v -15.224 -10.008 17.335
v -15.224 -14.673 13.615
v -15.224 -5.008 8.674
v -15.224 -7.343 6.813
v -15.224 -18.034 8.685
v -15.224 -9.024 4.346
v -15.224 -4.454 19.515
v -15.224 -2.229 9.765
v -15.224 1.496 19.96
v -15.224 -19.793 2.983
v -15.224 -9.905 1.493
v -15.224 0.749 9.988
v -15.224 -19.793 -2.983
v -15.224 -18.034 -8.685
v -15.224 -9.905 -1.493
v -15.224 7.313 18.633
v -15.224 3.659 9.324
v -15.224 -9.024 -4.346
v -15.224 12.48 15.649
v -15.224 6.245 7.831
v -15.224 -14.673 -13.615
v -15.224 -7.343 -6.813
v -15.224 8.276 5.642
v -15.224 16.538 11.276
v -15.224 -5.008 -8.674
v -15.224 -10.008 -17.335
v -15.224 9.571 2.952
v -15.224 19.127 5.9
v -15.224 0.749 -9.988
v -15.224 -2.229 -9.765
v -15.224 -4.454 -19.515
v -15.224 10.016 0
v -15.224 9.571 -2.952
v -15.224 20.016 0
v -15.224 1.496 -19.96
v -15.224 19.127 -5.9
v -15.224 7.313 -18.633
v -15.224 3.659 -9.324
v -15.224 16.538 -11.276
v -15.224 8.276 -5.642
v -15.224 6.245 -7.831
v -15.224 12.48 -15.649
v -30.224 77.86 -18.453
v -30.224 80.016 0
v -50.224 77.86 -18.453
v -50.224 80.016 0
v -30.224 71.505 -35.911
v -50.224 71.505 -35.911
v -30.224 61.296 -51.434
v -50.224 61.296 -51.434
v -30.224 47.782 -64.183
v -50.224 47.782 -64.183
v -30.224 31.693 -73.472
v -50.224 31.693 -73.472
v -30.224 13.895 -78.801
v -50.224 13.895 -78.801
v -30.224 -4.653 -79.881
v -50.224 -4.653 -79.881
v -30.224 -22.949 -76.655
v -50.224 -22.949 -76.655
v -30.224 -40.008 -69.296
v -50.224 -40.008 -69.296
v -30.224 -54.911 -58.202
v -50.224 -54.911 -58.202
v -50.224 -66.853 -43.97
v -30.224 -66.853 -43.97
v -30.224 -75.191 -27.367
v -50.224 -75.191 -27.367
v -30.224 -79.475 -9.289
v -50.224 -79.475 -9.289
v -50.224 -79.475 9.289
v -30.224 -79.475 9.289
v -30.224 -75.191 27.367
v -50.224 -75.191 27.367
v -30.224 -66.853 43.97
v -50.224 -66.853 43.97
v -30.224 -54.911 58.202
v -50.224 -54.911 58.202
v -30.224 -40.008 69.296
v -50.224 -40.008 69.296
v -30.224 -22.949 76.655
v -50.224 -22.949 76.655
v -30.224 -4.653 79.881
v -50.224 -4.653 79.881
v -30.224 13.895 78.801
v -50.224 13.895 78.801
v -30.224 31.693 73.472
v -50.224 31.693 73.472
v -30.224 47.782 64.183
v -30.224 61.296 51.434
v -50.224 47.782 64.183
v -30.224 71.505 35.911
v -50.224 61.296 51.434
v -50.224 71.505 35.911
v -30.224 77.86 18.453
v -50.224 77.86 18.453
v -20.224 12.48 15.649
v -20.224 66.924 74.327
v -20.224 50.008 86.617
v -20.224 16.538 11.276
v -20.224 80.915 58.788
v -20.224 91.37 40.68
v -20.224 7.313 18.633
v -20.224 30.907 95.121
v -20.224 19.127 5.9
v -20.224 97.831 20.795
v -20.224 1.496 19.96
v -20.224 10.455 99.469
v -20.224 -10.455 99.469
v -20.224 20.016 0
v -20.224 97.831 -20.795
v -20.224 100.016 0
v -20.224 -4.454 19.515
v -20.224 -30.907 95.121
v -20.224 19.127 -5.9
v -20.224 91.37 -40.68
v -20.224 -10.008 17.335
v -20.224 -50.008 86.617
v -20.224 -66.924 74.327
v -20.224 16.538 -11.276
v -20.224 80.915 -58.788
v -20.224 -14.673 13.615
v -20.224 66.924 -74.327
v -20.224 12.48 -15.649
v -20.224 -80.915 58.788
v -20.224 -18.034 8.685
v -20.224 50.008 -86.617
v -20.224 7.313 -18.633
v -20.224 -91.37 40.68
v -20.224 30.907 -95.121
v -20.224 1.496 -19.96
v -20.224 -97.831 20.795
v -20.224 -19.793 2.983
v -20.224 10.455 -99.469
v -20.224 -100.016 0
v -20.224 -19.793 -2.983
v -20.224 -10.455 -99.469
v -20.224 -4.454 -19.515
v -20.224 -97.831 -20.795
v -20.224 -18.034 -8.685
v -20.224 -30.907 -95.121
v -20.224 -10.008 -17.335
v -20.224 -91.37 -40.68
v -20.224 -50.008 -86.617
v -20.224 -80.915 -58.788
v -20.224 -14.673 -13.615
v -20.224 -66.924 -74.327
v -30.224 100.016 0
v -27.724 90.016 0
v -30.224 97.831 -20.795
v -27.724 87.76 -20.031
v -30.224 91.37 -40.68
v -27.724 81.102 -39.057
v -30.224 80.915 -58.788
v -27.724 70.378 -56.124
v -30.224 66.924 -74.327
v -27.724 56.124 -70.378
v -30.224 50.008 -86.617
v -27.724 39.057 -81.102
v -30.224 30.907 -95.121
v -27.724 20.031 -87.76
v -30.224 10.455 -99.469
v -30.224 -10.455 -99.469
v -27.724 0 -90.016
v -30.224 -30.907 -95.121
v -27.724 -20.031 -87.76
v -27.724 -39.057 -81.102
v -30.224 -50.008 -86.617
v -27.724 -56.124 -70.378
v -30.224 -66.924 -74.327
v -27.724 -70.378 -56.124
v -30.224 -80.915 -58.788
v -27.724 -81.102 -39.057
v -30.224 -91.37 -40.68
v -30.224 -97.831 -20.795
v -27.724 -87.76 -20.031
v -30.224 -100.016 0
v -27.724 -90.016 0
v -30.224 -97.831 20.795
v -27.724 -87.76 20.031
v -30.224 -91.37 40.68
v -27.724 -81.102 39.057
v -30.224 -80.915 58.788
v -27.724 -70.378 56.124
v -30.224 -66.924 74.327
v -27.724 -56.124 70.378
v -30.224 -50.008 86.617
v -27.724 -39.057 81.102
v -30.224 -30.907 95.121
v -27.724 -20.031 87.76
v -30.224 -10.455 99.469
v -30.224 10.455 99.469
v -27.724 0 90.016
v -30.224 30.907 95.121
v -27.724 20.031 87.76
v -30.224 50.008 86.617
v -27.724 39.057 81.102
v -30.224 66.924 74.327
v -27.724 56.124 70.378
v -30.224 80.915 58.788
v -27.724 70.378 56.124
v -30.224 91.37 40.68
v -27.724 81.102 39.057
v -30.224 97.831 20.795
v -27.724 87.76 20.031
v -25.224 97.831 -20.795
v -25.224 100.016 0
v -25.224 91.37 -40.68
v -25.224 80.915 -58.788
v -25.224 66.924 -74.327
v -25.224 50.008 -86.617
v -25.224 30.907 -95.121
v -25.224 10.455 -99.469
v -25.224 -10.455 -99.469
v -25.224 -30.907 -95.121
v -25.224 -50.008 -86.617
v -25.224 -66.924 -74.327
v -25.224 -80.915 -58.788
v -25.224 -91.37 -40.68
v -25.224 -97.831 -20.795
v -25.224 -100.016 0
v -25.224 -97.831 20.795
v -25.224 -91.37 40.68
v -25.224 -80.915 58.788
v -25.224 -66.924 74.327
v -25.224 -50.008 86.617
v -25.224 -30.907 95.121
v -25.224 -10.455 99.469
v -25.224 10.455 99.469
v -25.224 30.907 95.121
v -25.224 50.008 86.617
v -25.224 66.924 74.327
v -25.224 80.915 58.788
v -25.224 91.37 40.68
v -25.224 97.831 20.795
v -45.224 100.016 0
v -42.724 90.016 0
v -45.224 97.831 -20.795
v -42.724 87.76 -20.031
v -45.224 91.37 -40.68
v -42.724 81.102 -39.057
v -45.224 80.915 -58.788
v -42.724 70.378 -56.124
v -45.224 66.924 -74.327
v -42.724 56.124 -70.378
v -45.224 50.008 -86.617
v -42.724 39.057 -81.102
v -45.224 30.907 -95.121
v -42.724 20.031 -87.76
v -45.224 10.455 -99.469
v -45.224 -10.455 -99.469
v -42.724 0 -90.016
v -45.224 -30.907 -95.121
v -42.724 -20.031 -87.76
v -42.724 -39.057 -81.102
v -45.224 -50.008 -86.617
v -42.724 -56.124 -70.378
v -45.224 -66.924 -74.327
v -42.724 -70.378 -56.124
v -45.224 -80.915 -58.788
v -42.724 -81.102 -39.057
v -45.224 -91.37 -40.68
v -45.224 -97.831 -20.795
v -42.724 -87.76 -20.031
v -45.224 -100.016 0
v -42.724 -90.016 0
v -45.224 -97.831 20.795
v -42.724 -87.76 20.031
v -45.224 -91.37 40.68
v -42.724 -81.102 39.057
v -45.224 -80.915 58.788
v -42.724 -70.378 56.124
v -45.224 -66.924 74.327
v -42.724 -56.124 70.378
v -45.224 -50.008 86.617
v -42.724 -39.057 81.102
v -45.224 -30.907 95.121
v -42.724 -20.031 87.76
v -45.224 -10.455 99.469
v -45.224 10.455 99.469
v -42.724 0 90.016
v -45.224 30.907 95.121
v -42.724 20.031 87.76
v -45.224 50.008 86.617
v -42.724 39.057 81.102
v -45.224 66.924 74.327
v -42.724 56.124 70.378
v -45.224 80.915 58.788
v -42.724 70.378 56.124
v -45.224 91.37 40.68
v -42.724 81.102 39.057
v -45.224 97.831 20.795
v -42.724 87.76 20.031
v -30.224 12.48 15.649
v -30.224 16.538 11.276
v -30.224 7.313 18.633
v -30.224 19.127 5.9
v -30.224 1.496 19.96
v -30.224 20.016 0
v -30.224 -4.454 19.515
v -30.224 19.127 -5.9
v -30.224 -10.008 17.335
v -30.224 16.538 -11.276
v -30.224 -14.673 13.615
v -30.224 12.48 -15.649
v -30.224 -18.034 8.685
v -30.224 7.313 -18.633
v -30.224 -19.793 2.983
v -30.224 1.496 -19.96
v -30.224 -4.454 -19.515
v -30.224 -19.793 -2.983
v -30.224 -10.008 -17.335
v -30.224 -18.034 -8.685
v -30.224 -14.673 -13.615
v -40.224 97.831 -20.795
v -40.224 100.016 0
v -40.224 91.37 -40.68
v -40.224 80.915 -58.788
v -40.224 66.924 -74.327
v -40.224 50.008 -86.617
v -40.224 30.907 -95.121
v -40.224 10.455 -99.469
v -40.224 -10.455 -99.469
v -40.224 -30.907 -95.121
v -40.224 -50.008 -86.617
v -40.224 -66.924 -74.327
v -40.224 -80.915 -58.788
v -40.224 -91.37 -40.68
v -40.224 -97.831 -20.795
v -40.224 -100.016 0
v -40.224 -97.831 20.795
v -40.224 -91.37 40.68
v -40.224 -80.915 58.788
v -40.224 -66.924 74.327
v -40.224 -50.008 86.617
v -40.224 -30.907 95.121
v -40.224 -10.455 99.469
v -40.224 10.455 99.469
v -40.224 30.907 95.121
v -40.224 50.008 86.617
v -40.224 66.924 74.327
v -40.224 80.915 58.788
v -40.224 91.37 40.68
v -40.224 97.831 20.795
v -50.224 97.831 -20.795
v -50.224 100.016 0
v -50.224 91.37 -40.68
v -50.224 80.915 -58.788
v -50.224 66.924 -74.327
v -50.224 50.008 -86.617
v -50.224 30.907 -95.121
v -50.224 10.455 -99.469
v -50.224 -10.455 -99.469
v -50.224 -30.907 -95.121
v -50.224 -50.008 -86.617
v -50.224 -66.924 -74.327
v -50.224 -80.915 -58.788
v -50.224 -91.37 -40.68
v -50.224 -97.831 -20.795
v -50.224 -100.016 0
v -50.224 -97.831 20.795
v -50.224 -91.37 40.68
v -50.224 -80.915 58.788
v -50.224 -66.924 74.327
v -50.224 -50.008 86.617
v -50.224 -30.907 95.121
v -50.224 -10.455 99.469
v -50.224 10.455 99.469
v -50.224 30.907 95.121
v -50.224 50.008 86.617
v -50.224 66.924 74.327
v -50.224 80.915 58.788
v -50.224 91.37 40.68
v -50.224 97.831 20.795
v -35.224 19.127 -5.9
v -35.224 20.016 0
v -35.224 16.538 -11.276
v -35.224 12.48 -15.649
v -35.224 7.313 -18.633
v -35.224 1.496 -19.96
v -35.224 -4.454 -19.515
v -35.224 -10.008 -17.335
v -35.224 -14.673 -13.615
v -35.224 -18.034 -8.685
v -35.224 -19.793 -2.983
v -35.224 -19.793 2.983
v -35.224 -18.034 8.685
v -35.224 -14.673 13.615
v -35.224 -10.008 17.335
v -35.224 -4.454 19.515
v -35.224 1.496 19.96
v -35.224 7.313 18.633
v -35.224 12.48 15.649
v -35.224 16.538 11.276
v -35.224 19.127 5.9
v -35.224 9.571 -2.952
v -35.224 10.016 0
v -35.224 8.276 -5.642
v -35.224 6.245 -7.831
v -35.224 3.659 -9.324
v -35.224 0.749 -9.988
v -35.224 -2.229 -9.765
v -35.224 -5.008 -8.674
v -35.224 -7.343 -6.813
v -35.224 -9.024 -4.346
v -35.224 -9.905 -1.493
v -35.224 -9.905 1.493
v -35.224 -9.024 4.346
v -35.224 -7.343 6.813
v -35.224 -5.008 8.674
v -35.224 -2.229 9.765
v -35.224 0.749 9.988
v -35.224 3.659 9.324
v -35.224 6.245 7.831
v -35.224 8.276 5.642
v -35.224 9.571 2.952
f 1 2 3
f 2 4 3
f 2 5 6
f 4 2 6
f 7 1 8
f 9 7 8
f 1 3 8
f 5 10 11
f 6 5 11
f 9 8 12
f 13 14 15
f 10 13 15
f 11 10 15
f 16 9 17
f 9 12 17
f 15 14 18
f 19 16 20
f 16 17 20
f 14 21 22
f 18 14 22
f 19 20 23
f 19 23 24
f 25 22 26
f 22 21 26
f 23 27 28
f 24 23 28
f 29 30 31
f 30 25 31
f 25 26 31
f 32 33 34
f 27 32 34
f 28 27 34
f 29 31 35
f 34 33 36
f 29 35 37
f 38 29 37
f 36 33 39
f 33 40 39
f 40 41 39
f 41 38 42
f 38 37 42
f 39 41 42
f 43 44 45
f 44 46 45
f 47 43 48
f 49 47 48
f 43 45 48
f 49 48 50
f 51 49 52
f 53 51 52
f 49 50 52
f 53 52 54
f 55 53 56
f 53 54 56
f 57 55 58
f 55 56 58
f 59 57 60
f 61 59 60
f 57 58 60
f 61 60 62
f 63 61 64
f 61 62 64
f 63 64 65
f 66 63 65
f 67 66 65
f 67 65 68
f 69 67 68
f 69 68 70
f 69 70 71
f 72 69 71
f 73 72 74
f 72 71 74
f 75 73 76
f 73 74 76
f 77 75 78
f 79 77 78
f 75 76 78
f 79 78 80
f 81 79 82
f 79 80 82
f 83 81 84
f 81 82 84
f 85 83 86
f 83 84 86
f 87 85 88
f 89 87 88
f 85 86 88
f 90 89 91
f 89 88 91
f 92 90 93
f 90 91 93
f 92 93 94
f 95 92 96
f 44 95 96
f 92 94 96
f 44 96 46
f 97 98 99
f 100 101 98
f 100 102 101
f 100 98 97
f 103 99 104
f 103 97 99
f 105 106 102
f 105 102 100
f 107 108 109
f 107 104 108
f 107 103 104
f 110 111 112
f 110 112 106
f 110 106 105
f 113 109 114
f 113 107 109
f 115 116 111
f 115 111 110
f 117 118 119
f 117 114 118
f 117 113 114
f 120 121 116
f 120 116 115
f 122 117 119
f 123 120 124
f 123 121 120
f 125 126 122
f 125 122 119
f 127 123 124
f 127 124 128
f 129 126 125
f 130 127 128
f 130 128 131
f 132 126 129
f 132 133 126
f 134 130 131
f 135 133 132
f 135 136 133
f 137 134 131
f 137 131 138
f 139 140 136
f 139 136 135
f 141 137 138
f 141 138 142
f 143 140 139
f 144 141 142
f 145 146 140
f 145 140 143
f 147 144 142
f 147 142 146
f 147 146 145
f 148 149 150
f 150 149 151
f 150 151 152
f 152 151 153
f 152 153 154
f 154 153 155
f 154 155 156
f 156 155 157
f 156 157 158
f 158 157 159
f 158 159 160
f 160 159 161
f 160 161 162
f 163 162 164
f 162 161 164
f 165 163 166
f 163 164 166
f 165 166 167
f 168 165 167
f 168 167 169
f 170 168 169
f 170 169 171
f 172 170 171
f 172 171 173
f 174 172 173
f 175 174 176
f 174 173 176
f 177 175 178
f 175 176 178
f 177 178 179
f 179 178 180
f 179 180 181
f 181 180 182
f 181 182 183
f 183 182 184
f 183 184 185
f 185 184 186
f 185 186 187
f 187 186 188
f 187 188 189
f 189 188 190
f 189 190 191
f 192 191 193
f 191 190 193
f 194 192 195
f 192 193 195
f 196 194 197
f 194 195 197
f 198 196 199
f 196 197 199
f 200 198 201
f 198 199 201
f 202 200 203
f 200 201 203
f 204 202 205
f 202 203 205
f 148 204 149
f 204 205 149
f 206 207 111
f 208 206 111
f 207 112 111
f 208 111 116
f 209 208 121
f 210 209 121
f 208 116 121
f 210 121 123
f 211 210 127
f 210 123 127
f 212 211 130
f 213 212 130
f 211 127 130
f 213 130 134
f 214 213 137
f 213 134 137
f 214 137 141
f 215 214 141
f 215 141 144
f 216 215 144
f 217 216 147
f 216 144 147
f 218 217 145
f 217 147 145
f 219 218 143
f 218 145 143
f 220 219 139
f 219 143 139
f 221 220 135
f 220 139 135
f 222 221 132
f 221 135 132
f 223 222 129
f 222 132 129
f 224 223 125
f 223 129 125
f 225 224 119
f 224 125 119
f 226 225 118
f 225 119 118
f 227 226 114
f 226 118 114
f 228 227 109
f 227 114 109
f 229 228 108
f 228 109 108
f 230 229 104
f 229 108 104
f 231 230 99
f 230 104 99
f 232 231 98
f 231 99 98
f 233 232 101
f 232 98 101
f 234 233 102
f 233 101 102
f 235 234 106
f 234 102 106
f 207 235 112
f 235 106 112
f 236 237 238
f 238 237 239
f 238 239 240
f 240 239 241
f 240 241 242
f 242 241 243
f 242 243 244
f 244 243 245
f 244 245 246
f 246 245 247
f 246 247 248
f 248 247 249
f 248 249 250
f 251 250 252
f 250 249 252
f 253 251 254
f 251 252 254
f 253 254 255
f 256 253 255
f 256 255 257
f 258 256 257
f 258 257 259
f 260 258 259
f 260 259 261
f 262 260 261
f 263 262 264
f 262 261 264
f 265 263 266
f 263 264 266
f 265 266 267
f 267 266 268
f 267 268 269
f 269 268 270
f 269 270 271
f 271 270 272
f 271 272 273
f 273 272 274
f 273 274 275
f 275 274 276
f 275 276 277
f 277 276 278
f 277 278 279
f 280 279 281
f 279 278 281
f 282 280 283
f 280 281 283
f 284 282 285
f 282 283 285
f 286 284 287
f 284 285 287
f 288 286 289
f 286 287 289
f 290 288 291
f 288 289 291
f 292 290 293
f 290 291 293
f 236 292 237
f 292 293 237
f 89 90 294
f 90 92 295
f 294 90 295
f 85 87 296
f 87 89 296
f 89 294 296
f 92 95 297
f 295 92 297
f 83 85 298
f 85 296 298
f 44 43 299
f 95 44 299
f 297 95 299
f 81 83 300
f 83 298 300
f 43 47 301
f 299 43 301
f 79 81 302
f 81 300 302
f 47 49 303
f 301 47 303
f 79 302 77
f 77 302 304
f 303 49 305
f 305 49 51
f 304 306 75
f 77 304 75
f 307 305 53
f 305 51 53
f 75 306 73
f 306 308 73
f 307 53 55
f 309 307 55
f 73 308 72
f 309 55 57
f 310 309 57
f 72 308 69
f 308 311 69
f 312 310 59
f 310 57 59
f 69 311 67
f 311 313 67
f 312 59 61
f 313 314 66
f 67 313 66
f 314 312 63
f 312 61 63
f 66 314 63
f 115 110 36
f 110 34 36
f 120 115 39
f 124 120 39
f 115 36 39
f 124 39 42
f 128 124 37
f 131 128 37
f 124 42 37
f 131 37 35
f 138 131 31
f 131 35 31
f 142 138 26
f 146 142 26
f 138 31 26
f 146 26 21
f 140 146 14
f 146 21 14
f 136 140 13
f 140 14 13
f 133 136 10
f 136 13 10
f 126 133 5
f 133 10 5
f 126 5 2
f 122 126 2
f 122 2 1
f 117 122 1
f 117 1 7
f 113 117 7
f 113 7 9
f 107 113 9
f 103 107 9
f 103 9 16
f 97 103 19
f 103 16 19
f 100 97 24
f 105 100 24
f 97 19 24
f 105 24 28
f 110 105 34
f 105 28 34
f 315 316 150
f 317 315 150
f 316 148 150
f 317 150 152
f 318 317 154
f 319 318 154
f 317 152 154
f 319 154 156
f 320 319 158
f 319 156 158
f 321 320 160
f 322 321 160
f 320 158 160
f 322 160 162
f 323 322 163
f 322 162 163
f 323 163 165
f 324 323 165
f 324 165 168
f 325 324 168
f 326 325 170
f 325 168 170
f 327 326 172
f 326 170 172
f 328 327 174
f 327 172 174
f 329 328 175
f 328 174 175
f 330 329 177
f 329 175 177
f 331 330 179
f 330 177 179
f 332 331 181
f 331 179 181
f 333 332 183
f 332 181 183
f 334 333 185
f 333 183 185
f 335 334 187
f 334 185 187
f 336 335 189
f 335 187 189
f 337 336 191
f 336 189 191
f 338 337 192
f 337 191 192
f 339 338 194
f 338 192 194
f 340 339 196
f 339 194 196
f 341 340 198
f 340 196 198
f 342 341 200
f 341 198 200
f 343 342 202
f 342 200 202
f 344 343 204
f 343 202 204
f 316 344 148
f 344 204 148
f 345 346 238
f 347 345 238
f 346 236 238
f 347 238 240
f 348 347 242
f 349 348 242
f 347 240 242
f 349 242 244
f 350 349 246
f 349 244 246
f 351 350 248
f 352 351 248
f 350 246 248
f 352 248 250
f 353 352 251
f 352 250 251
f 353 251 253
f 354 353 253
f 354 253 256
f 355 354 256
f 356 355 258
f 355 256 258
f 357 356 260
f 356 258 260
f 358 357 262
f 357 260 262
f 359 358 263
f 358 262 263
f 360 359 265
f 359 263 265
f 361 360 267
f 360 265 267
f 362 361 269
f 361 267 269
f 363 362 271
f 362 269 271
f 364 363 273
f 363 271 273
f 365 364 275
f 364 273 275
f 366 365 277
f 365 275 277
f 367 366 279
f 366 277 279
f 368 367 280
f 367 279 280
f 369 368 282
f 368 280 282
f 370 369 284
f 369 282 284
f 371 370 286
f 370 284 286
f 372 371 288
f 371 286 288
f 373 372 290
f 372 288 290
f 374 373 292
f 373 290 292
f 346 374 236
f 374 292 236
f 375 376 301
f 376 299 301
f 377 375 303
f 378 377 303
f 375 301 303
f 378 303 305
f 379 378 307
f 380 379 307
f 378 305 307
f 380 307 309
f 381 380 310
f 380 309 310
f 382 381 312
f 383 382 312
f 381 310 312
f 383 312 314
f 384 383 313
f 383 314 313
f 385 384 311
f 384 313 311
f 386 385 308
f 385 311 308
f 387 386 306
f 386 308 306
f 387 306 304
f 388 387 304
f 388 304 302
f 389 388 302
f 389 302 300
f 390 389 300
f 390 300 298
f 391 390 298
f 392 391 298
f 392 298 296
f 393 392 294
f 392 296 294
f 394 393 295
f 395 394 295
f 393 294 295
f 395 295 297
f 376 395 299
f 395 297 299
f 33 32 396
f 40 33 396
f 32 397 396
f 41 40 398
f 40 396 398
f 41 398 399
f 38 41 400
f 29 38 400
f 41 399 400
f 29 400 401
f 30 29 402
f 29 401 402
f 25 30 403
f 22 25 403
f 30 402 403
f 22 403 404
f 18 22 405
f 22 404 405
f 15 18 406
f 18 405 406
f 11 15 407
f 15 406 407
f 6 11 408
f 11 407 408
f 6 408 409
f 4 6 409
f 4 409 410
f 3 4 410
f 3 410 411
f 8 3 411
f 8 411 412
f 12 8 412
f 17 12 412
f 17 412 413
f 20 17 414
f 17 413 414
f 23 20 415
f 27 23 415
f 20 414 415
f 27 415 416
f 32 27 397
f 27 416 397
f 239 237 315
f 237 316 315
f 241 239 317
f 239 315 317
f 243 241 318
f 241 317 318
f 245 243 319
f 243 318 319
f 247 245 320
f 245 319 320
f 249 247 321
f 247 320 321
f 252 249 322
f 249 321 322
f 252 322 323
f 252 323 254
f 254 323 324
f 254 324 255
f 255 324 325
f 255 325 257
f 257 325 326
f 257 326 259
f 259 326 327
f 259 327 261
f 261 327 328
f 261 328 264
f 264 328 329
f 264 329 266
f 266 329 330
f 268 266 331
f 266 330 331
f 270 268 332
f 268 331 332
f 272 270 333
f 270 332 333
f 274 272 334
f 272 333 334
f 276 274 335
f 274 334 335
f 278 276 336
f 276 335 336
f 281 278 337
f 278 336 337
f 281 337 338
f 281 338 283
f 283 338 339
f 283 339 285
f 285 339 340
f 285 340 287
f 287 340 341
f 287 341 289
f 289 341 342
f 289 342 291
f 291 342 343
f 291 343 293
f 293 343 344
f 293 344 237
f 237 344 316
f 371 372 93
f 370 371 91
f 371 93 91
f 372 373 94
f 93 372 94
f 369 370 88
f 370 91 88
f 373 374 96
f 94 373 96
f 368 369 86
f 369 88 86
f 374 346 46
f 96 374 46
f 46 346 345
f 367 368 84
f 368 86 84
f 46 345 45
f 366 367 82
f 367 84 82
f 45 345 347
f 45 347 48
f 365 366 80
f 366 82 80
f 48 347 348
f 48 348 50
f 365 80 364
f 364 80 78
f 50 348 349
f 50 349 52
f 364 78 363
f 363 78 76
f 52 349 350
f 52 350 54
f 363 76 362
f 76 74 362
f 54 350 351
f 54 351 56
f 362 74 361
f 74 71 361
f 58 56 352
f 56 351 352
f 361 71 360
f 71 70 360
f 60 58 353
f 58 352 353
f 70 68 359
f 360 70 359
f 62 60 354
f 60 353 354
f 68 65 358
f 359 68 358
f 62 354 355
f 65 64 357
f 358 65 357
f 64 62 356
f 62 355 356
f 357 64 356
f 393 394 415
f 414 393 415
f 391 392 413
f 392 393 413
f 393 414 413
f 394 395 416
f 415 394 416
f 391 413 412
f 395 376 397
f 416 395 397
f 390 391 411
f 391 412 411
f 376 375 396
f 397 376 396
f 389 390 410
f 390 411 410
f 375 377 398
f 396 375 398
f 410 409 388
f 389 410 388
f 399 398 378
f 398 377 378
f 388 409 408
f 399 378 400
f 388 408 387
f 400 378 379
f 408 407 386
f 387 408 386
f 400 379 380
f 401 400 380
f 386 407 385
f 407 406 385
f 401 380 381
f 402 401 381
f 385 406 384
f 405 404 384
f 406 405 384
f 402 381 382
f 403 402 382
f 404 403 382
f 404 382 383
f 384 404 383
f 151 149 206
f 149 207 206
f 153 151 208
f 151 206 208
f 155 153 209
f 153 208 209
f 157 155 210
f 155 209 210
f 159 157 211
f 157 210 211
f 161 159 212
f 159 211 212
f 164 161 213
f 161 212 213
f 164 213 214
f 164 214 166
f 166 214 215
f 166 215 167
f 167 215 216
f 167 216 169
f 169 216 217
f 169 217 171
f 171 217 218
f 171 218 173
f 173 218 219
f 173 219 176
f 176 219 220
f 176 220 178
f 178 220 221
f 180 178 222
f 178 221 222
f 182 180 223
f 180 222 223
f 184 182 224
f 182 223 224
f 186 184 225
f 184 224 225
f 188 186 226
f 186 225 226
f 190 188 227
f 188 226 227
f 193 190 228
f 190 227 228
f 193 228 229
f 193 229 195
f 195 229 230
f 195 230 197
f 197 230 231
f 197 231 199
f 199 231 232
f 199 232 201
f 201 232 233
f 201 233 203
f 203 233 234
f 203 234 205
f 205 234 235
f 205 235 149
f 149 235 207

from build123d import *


with BuildPart() as part:
    # Croquis1 → Revolución3 (revolve)
    with BuildSketch(Plane.XY):
        Polygon((-15.224198293, 10.01641294), (-35.224198293, 10.01641294), (-35.224198293, 20.01641294), (-30.224198293, 20.01641294), (-30.224198293, 80.01641294), (-50.224198293, 80.01641294), (-50.224198293, 100.01641294), (-45.224198293, 100.01641294), (-42.724198293, 90.01641294), (-40.224198293, 100.01641294), (-30.224198293, 100.01641294), (-27.724198293, 90.01641294), (-25.224198293, 100.01641294), (-20.224198293, 100.01641294), (-20.224198293, 80.01641294), (-20.224198293, 20.01641294), (-15.224198293, 20.01641294), align=None)
    revolve(axis=Axis((68.905582562, 0, 0), (-1, 0, 0)))


solid = part.part
